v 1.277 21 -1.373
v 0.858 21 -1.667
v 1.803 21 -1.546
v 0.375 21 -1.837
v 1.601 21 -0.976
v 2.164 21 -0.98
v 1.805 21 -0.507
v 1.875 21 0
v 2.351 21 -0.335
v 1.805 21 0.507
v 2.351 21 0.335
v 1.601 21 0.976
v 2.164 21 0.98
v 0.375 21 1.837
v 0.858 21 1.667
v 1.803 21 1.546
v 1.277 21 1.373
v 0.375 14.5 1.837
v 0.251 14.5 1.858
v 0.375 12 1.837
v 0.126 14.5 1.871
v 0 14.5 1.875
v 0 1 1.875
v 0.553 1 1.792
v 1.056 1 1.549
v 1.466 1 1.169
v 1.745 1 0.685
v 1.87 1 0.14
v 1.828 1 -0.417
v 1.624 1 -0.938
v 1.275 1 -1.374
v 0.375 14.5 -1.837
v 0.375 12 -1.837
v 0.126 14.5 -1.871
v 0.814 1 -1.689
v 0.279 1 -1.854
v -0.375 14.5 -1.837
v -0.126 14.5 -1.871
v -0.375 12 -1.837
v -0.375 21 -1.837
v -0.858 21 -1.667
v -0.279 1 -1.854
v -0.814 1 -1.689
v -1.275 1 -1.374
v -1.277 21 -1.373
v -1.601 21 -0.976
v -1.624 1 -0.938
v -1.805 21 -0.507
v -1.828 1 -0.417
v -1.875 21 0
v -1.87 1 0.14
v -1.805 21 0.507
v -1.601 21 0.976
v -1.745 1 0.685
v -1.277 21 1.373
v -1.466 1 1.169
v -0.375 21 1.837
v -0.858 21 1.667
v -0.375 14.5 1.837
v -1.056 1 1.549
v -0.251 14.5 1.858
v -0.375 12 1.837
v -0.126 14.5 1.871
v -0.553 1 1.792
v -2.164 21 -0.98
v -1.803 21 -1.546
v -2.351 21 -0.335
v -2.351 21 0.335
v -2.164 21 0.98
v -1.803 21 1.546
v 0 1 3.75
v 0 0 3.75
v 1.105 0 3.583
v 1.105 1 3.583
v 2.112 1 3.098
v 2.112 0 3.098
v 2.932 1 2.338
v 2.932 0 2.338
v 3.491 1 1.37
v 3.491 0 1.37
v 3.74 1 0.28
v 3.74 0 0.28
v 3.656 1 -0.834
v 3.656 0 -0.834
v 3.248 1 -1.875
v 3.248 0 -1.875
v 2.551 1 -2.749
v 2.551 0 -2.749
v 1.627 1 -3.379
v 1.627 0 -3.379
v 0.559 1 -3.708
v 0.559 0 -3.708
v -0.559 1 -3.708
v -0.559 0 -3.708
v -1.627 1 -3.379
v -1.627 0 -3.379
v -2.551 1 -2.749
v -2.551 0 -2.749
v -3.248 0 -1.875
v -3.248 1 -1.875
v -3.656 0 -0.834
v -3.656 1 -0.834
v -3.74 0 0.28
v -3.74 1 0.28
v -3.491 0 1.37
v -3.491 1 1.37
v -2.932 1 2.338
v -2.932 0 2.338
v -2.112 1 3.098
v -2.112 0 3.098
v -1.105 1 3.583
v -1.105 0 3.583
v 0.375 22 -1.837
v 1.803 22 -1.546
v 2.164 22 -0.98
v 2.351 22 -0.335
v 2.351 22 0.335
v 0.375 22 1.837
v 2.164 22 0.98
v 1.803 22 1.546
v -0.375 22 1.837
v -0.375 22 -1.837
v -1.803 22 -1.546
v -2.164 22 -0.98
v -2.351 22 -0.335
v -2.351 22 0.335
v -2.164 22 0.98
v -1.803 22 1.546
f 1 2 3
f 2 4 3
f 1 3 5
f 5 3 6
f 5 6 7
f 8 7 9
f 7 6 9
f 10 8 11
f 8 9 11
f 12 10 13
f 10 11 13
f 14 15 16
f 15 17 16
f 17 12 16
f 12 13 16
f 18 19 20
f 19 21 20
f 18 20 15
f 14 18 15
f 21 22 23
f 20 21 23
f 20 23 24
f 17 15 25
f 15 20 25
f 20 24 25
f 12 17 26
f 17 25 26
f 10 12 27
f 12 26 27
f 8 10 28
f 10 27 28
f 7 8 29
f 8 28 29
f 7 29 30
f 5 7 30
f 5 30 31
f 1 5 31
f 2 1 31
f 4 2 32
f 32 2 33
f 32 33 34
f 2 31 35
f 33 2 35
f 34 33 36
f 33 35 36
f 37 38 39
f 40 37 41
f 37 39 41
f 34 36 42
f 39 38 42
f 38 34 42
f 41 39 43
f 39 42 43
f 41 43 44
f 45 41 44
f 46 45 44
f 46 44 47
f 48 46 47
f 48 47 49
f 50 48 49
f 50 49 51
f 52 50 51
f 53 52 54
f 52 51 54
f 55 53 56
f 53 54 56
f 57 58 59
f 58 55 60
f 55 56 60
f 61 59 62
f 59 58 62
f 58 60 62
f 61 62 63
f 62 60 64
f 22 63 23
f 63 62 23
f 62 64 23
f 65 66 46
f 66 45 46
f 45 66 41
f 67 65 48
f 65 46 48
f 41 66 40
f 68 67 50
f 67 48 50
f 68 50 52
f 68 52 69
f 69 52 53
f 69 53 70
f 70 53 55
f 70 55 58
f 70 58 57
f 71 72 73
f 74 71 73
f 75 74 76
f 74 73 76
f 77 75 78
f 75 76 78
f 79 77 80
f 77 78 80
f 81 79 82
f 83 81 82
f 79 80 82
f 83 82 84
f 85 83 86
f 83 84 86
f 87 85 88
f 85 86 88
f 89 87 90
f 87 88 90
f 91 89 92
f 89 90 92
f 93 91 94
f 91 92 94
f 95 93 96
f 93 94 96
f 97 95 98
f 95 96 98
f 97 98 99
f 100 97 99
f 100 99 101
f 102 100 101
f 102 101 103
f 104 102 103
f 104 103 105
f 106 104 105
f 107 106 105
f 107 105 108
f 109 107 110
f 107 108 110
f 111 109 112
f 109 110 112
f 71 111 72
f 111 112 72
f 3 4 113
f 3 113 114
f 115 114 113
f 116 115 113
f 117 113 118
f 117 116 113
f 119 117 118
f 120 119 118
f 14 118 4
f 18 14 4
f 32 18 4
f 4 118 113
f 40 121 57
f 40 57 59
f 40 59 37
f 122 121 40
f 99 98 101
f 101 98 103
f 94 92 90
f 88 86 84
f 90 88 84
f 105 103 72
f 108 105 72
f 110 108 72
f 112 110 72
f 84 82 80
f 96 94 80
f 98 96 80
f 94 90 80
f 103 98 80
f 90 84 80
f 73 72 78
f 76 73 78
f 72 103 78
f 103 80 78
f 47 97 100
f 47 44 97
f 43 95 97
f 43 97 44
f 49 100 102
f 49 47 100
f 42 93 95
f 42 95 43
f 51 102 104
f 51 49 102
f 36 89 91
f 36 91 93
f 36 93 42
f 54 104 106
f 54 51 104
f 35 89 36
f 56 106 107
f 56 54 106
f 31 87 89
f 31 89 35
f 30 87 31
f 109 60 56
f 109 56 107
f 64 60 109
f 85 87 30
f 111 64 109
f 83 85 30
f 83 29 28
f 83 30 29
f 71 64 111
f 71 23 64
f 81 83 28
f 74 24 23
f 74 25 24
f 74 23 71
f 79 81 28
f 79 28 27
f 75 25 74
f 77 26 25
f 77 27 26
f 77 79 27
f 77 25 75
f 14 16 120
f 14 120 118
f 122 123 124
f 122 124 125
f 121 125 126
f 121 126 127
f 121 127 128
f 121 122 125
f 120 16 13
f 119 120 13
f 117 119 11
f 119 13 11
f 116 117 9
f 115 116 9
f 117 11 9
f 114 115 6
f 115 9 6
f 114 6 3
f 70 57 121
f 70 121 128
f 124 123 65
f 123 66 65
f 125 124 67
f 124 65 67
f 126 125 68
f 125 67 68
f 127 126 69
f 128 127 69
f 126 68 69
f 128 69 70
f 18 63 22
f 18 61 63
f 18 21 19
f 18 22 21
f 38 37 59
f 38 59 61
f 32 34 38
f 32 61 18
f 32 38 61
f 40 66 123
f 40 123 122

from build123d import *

# Parameters (mm, degrees)
SKETCH1_R           = 3.75
BOSS_EXTRUDE1_DEPTH = 1
SKETCH2_R           = 1.875
BOSS_EXTRUDE2_DEPTH = 20
SKETCH3_R           = 2.375
BOSS_EXTRUDE3_DEPTH = 1
SKETCH4_W           = 0.75
SKETCH4_H           = 8
CUT_EXTRUDE1_DEPTH  = 7.5
CUT_EXTRUDE2_START  = -10
CUT_EXTRUDE2_DEPTH  = 10


with BuildPart() as part:
    # Sketch1 → Boss-Extrude1 (new body)
    with BuildSketch(Plane(origin=(0, 0, 0), x_dir=(1, 0, 0), z_dir=(0, 1, 0))):
        with Locations(Location((0, 0, 0), (0, 0, 270))):
            Circle(SKETCH1_R)
    extrude(amount=BOSS_EXTRUDE1_DEPTH)

    # Sketch2 → Boss-Extrude2 (add)
    with BuildSketch(Plane(origin=(0, 1, 0), x_dir=(1, 0, 0), z_dir=(0, 1, 0))):
        with Locations(Location((0, 0, 0), (0, 0, 270))):
            Circle(SKETCH2_R)
    extrude(amount=BOSS_EXTRUDE2_DEPTH)

    # Sketch3 → Boss-Extrude3 (add)
    with BuildSketch(Plane(origin=(0, 21, 0), x_dir=(1, 0, 0), z_dir=(0, 1, 0))):
        with Locations(Location((0, 0, 0), (0, 0, 270))):
            Circle(SKETCH3_R)
    extrude(amount=BOSS_EXTRUDE3_DEPTH)

    # Sketch4 → Cut-Extrude1 (cut)
    with BuildSketch(Plane(origin=(0, 22, 0), x_dir=(1, 0, 0), z_dir=(0, 1, 0))):
        Rectangle(SKETCH4_W, SKETCH4_H)
    extrude(amount=-CUT_EXTRUDE1_DEPTH, mode=Mode.SUBTRACT)

    # Sketch5 → Cut-Extrude2 (cut)
    with BuildSketch(Plane(origin=(0, 22, 0), x_dir=(1, 0, 0), z_dir=(0, 1, 0)).offset(CUT_EXTRUDE2_START)):
        with BuildLine():
            Line((1.803285686, -1.545569712), (0.375, -1.837117307))
            Line((0.375, -1.837117307), (0.375, -2.34520788))
            ThreePointArc((0.375, -2.34520788), (1.160210081, -2.072326607), (1.803285686, -1.545569712))
        make_face()
        with BuildLine():
            Line((0.375, 2.34520788), (0.375, 1.837117307))
            Line((0.375, 1.837117307), (1.803285686, 1.545569712))
            ThreePointArc((1.803285686, 1.545569712), (1.160210081, 2.072326607), (0.375, 2.34520788))
        make_face()
        with BuildLine():
            Line((-1.803285686, 1.545569712), (-0.375, 1.837117307))
            Line((-0.375, 1.837117307), (-0.375, 2.34520788))
            ThreePointArc((-0.375, 2.34520788), (-1.160210081, 2.072326607), (-1.803285686, 1.545569712))
        make_face()
        with BuildLine():
            Line((-0.375, -2.34520788), (-0.375, -1.837117307))
            Line((-0.375, -1.837117307), (-1.803285686, -1.545569712))
            ThreePointArc((-1.803285686, -1.545569712), (-1.160210081, -2.072326607), (-0.375, -2.34520788))
        make_face()
    extrude(amount=CUT_EXTRUDE2_DEPTH, mode=Mode.SUBTRACT)


solid = part.part
